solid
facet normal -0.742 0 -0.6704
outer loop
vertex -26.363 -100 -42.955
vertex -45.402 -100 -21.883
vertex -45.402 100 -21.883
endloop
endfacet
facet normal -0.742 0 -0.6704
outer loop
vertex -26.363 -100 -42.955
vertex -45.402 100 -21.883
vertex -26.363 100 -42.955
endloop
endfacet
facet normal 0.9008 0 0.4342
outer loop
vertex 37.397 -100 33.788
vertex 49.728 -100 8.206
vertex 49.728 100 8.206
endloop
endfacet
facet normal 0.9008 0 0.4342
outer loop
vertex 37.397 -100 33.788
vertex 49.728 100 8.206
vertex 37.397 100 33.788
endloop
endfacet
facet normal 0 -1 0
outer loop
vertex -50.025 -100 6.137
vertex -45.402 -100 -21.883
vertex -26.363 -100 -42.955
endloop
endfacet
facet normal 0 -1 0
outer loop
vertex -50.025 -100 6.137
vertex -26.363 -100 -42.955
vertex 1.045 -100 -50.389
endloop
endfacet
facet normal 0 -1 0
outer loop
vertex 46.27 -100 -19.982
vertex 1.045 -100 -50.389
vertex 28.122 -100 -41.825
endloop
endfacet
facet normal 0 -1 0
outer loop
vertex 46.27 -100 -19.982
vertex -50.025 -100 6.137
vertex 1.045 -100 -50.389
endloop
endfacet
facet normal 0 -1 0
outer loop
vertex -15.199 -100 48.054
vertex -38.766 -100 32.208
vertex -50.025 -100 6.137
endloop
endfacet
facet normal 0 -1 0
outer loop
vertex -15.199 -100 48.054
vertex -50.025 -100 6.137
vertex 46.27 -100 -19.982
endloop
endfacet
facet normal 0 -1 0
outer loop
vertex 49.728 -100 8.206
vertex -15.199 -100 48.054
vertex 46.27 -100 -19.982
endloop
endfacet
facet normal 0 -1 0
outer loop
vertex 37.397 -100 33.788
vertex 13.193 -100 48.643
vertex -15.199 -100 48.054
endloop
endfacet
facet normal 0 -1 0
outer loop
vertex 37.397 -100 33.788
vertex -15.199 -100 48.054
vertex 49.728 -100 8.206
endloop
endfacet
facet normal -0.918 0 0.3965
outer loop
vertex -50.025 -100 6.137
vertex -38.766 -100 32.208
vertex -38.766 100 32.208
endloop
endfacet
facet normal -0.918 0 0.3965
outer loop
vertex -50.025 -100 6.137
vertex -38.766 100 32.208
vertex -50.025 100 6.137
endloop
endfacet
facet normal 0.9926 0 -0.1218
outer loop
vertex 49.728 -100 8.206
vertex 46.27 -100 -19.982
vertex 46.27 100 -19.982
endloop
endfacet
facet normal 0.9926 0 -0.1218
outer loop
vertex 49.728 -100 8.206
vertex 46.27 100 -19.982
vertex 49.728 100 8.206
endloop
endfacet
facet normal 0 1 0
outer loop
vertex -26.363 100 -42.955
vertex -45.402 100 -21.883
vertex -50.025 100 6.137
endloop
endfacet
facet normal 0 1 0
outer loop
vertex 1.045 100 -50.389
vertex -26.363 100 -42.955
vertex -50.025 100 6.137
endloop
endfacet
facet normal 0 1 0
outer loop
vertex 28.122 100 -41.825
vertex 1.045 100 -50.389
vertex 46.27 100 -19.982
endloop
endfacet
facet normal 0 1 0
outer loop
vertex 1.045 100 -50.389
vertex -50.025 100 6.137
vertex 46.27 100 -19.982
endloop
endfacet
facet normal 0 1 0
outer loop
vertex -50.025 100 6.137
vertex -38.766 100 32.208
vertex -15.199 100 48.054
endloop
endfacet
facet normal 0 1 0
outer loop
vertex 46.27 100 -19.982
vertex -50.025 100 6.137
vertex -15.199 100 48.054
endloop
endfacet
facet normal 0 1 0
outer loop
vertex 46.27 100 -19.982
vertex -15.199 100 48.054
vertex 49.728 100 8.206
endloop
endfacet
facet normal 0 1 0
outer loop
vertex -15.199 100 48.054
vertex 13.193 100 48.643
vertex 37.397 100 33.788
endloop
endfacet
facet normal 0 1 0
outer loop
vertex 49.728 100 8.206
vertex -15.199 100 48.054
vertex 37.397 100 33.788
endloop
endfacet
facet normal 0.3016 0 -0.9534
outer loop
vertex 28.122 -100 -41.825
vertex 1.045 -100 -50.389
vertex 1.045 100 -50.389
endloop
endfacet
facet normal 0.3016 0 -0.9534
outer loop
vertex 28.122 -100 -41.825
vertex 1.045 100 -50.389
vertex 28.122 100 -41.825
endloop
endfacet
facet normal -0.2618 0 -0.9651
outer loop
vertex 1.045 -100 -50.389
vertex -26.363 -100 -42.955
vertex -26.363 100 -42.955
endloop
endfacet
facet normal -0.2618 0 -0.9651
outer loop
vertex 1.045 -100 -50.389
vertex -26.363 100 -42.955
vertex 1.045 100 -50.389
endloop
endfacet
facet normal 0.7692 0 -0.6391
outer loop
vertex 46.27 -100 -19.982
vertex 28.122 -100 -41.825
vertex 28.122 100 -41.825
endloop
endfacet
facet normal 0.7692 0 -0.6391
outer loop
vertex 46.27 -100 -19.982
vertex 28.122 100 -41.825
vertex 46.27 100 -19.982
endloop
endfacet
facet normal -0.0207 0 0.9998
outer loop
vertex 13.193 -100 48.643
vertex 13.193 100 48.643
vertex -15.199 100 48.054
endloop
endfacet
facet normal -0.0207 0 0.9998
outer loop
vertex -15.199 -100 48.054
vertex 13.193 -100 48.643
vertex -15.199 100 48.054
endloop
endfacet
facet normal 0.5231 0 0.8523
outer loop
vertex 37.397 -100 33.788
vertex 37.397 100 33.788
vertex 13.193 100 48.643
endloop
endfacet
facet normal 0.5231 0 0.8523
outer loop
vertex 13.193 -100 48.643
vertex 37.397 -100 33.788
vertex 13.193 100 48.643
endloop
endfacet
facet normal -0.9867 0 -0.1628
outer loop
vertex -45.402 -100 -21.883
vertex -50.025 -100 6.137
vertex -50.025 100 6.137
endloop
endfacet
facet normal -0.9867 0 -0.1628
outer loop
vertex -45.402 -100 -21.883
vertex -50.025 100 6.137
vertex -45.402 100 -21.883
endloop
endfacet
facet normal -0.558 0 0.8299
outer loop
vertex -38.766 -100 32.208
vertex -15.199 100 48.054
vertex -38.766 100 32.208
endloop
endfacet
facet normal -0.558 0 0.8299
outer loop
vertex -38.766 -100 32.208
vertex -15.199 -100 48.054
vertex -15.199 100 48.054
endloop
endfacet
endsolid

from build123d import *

# Parameters (mm, degrees)
F1_DEPTH = 100


with BuildPart() as f1:
    # F0 (on Front) → F1 (new body, symmetric)
    with BuildSketch(Plane.XZ):
        Polygon((-15.199252, 48.053728), (-38.766231, 32.208033), (-50.025206, 6.136514), (-45.401532, -21.883304), (-26.363192, -42.955328), (1.045276, -50.389339), (28.121875, -41.825091), (46.269978, -19.981672), (49.72769, 8.205787), (37.397212, 33.787966), (13.193383, 48.642705), align=None)
    extrude(amount=F1_DEPTH, both=True)


solid = f1.part
